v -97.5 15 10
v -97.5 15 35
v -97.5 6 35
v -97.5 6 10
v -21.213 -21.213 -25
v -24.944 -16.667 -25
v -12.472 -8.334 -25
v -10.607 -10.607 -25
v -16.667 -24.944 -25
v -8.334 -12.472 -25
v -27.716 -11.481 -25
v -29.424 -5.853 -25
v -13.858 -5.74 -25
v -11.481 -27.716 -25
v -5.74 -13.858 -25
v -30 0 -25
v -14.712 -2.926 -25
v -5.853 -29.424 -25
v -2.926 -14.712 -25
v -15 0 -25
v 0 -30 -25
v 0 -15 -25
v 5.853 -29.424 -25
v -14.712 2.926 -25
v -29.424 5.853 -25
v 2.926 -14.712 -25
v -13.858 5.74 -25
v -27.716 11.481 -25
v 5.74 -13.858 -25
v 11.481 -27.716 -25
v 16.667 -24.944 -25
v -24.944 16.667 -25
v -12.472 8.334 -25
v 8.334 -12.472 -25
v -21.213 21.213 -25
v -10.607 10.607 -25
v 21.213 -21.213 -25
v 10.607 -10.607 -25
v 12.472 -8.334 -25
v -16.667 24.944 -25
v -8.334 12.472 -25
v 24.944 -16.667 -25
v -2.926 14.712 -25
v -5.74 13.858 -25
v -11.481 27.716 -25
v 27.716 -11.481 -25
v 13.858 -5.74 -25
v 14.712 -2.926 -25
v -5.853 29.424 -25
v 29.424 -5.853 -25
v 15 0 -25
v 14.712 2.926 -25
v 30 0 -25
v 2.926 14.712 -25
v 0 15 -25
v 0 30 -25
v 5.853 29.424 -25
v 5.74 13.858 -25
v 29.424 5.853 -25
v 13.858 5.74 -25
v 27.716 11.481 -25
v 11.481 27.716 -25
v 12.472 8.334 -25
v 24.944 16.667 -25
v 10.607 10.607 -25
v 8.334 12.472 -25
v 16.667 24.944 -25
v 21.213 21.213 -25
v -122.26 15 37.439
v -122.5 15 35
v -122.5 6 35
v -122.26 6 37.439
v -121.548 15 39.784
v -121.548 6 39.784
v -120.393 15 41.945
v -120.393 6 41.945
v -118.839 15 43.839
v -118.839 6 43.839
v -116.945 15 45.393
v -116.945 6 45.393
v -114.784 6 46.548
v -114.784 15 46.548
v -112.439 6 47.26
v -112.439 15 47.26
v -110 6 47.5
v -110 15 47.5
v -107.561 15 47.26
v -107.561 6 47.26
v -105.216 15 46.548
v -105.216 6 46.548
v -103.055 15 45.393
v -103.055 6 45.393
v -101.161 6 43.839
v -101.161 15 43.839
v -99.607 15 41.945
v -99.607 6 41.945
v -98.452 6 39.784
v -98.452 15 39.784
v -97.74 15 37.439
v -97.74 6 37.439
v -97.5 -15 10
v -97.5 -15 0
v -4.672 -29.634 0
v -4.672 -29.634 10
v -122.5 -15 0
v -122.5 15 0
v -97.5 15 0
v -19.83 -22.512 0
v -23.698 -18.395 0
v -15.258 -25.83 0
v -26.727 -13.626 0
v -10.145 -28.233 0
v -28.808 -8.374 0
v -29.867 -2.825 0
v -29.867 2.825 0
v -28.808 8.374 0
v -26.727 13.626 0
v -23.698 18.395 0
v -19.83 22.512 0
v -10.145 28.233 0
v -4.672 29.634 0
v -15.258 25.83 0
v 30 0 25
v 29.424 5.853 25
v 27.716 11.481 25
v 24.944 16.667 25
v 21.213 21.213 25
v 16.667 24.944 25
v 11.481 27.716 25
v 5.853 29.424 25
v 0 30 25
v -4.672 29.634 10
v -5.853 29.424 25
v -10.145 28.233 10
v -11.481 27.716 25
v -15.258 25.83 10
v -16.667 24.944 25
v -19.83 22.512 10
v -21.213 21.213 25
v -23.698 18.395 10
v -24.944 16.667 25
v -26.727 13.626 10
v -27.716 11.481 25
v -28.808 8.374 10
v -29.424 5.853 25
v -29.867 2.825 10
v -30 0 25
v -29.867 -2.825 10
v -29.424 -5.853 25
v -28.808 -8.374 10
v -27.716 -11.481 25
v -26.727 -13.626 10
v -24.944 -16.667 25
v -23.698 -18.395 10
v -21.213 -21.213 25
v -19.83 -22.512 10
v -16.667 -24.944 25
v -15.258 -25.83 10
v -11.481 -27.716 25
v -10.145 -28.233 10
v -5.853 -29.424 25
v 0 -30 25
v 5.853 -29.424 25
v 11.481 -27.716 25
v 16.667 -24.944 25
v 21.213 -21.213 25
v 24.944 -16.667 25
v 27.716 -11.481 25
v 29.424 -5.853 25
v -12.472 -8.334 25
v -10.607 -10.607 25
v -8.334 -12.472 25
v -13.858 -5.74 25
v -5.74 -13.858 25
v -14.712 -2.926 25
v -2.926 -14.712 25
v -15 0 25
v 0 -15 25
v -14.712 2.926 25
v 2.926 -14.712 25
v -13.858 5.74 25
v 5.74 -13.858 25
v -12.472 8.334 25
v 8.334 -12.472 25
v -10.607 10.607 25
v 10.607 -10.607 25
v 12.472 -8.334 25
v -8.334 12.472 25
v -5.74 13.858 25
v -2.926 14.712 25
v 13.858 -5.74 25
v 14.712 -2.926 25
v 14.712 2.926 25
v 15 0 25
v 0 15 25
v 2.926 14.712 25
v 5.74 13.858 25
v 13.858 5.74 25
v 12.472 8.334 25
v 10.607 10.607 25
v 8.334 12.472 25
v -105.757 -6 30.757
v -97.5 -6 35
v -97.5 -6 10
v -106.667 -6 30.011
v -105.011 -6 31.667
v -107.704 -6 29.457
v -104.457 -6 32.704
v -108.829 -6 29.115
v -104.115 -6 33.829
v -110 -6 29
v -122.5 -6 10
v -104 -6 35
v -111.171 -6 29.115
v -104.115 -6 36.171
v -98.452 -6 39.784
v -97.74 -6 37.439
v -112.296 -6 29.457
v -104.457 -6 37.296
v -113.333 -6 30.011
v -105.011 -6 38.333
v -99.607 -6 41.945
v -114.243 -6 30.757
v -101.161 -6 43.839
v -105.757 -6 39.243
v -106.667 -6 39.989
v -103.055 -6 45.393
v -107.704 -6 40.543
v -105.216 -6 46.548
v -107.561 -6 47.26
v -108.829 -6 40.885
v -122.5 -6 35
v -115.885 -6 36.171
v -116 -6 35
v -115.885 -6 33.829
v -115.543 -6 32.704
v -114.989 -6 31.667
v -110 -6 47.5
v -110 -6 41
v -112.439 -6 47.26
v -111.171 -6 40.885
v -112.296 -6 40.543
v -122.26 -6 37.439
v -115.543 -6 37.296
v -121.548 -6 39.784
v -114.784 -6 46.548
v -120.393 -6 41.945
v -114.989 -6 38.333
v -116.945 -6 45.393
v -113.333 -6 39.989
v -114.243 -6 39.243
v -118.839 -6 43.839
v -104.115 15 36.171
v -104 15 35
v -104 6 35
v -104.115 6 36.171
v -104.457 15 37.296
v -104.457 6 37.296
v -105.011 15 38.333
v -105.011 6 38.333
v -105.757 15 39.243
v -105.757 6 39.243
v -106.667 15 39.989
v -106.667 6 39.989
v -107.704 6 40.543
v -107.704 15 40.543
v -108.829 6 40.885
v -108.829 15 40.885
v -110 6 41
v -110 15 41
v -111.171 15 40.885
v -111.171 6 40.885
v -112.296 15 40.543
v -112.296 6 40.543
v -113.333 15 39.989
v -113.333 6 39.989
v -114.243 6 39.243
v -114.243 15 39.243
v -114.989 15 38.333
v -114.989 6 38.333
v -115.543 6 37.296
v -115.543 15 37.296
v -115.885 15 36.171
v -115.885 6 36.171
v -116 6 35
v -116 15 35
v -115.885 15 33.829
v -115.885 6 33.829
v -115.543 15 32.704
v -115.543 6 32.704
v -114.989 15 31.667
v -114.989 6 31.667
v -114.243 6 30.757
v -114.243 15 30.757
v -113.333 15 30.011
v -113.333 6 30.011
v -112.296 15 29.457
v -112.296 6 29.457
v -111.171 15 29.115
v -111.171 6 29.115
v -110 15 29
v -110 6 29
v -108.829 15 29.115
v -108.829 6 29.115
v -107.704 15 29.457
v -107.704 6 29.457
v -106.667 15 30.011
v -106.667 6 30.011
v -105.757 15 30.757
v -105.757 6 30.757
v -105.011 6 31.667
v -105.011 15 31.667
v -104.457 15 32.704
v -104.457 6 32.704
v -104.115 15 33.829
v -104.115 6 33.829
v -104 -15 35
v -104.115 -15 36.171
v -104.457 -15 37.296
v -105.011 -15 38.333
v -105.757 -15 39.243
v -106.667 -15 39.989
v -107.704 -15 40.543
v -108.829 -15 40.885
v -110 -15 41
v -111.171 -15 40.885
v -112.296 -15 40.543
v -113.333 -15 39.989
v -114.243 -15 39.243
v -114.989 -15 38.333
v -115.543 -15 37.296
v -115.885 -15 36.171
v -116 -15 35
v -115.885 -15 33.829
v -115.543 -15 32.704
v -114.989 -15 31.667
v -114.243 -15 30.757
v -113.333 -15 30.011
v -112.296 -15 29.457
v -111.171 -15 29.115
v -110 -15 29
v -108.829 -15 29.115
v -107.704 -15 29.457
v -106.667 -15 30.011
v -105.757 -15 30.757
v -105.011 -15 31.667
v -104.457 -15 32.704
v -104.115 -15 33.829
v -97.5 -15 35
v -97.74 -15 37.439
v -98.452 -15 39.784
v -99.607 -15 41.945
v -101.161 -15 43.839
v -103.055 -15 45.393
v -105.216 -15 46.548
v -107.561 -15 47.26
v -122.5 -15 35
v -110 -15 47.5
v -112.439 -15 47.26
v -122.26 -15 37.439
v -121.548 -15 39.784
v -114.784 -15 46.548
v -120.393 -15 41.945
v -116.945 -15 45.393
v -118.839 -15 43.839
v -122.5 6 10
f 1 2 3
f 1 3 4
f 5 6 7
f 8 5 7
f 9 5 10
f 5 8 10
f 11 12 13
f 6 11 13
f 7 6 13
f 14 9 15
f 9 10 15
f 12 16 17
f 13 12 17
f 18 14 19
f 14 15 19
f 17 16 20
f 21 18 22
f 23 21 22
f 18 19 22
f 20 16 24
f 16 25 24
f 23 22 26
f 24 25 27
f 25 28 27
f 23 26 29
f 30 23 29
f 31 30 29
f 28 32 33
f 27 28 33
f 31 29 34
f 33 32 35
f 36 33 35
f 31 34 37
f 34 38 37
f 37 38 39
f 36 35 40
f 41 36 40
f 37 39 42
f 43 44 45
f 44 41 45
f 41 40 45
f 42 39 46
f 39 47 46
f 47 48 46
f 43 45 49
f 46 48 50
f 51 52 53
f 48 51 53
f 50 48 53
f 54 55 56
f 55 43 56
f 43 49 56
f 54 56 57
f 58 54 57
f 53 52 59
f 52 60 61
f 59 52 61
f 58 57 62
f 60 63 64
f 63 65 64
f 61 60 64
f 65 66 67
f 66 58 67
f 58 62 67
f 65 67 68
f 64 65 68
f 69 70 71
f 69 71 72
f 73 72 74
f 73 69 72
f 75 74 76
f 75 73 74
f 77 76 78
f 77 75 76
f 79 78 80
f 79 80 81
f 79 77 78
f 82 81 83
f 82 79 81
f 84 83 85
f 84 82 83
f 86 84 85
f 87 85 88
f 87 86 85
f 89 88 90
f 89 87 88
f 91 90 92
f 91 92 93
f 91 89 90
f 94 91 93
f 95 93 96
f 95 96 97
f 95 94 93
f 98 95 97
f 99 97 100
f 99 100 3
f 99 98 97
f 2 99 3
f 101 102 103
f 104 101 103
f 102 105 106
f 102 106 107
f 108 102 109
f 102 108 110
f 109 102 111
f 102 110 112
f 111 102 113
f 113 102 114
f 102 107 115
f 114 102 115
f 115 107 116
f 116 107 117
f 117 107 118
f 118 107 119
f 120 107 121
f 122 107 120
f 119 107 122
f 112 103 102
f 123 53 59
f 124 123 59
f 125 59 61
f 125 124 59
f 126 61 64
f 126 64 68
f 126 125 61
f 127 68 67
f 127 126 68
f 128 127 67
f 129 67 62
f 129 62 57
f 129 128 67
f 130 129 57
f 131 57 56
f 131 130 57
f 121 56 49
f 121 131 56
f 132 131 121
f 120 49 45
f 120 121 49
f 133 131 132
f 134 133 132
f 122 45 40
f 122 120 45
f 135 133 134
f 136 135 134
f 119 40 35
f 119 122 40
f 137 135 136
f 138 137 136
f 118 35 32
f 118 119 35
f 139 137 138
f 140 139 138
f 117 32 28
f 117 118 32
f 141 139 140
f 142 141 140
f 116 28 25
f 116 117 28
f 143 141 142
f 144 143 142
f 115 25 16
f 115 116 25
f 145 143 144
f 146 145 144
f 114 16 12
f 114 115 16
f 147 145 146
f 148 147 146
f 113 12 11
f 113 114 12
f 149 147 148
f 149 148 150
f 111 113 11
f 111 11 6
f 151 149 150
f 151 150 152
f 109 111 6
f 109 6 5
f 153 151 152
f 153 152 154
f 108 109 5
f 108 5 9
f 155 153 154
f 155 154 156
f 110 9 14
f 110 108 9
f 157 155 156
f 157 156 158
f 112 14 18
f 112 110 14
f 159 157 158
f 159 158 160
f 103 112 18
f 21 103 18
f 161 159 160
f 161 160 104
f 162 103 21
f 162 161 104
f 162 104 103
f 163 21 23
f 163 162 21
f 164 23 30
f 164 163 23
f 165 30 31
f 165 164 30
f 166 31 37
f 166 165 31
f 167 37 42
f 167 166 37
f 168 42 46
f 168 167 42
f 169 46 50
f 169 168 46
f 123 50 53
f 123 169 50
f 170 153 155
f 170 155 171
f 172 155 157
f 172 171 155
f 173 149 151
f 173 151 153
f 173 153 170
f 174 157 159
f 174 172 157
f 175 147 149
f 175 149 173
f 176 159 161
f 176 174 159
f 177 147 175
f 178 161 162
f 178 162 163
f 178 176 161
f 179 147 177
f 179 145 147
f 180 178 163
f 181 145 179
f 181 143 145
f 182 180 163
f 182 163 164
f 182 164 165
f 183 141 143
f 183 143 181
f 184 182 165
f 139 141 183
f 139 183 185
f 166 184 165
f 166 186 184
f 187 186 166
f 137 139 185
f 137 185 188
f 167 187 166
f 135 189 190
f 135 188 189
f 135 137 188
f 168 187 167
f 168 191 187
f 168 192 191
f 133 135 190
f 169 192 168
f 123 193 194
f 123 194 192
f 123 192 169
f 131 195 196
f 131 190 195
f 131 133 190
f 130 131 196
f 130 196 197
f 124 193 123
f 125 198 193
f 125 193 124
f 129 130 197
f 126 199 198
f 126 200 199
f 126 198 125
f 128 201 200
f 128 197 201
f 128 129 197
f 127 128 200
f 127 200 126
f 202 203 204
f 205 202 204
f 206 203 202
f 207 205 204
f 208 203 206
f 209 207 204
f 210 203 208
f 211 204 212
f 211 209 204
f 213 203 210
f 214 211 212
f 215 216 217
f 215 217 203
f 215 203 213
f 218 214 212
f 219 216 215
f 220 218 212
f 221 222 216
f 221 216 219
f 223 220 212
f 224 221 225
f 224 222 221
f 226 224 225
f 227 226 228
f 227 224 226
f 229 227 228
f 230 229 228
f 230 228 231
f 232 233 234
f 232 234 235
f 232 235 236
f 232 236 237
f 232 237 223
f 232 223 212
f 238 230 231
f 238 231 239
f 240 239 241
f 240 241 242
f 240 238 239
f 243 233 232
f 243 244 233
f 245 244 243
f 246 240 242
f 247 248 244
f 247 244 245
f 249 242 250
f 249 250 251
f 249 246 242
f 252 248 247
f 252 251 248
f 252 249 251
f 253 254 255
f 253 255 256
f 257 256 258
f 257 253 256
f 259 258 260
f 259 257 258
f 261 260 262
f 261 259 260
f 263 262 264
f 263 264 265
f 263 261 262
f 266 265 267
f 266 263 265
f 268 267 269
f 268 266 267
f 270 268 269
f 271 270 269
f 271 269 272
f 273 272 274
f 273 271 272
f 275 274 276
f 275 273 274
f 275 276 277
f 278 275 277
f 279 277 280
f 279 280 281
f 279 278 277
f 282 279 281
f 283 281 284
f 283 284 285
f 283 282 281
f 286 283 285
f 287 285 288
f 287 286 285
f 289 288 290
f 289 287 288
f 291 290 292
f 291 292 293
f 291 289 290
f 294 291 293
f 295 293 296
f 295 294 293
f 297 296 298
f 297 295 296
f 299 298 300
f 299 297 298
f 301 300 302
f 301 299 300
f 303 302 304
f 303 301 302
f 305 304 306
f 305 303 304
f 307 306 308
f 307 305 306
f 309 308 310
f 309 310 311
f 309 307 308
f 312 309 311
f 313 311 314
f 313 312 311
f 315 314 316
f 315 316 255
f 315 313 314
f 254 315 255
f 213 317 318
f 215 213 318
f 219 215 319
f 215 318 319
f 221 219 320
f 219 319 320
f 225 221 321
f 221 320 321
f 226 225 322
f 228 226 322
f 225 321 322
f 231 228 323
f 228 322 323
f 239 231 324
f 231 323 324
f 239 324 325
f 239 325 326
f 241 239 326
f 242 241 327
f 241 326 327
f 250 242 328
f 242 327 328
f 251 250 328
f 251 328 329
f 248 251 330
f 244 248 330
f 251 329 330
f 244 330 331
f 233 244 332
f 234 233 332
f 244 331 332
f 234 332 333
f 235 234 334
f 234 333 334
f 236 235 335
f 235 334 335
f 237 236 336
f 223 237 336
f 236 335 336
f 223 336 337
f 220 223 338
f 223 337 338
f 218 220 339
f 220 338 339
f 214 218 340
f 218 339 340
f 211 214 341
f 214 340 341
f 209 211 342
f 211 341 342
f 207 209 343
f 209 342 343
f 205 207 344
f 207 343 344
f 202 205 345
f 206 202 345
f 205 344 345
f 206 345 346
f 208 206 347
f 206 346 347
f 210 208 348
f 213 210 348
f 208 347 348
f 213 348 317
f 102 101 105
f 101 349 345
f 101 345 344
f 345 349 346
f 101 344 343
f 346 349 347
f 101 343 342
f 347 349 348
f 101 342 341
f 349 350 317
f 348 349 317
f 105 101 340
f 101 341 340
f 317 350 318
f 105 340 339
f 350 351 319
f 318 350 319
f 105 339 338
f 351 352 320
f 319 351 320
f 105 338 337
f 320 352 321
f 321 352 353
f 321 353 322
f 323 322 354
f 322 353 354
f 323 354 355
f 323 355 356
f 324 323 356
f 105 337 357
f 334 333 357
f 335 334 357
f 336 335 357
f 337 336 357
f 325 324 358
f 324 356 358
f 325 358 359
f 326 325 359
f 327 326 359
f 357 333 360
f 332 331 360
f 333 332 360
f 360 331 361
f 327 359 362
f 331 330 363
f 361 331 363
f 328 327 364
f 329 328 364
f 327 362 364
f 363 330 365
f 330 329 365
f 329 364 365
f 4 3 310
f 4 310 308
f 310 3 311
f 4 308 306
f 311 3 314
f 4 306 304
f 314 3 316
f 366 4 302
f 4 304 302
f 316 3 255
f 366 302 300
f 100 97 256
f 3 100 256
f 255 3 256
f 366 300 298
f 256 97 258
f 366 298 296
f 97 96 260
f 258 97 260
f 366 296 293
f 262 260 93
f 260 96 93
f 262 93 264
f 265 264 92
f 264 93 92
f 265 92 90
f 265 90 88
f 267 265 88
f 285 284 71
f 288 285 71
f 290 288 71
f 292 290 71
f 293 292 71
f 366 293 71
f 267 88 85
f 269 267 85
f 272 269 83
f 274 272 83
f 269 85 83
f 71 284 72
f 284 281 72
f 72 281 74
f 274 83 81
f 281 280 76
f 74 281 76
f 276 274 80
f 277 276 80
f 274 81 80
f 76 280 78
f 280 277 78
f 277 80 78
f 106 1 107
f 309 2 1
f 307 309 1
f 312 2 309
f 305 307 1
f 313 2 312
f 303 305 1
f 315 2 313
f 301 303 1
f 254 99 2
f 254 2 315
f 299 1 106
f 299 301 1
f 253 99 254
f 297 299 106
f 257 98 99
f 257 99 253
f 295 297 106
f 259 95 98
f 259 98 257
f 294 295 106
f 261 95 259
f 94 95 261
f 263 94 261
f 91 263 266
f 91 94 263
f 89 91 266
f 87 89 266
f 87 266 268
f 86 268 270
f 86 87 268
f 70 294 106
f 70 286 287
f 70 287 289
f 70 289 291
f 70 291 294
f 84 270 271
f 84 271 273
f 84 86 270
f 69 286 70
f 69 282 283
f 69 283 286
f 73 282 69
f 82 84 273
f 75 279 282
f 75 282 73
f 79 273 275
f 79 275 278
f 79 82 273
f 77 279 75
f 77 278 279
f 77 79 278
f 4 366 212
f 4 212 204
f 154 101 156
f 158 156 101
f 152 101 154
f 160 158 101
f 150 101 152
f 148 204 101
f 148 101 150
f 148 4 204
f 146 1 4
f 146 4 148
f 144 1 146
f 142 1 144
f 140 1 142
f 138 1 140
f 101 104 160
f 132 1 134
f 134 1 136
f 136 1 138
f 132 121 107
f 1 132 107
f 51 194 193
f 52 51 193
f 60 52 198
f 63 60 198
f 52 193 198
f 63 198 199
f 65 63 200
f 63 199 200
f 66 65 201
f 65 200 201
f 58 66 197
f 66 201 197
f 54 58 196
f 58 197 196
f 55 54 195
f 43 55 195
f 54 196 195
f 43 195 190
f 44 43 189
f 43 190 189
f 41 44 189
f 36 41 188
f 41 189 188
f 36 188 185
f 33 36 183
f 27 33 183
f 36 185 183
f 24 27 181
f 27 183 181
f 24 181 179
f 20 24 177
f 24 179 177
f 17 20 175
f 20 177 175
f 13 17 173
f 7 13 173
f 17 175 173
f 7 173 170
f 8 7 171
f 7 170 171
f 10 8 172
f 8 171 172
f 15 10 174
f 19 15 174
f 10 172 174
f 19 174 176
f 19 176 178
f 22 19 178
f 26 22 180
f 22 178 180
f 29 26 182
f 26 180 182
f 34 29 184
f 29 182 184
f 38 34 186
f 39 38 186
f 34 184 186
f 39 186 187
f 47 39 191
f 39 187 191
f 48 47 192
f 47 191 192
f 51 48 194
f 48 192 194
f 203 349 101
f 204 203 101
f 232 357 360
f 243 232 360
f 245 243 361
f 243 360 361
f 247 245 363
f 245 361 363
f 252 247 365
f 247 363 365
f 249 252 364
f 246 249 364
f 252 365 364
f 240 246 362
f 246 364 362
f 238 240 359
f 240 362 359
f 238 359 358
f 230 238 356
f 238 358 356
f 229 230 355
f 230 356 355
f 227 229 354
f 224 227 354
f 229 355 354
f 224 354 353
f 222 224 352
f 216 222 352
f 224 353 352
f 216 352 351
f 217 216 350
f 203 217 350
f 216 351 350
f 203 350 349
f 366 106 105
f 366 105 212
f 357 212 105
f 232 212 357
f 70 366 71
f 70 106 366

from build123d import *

# Parameters (mm, degrees)
SKETCH1_R           = 30
BOSS_EXTRUDE1_DEPTH = 25
SKETCH2_R           = 15
CUT_EXTRUDE1_DEPTH  = 50
BOSS_EXTRUDE3_DEPTH = 10
SKETCH8_R           = 6
BOSS_EXTRUDE4_DEPTH = 9


with BuildPart() as part:
    # Sketch1 → Boss-Extrude1 (new body, symmetric)
    with BuildSketch(Plane.XY):
        Circle(SKETCH1_R)
    extrude(amount=BOSS_EXTRUDE1_DEPTH, both=True)

    # Sketch2 → Cut-Extrude1 (cut)
    with BuildSketch(Plane.XY.offset(25)):
        Circle(SKETCH2_R)
    extrude(amount=-CUT_EXTRUDE1_DEPTH, mode=Mode.SUBTRACT)

    # Sketch6 → Boss-Extrude3 (add)
    with BuildSketch(Plane.XY):
        with BuildLine():
            Line((-4.671688756, 29.634023084), (-97.5, 15))
            Line((-97.5, 15), (-122.5, 15))
            Line((-122.5, 15), (-122.5, -15))
            Line((-122.5, -15), (-97.5, -15))
            Line((-97.5, -15), (-4.671688756, -29.634023084))
            ThreePointArc((-4.671688756, -29.634023084), (-30, 0), (-4.671688756, 29.634023084))
        make_face()
    extrude(amount=BOSS_EXTRUDE3_DEPTH)

    # Sketch8 → Boss-Extrude4 (add)
    with BuildSketch(Plane.XZ.offset(15)):
        with BuildLine():
            Line((-122.5, 10), (-122.5, 35))
            ThreePointArc((-122.5, 35), (-110, 47.5), (-97.5, 35))
            Line((-97.5, 35), (-97.5, 10))
            Line((-97.5, 10), (-122.5, 10))
        make_face()
        with Locations((-110, 35)):
            Circle(SKETCH8_R, mode=Mode.SUBTRACT)
    boss_extrude4 = extrude(amount=-BOSS_EXTRUDE4_DEPTH)

    # Mirror1: Boss-Extrude4 across plane
    add(boss_extrude4.mirror(Plane.ZX))


solid = part.part
